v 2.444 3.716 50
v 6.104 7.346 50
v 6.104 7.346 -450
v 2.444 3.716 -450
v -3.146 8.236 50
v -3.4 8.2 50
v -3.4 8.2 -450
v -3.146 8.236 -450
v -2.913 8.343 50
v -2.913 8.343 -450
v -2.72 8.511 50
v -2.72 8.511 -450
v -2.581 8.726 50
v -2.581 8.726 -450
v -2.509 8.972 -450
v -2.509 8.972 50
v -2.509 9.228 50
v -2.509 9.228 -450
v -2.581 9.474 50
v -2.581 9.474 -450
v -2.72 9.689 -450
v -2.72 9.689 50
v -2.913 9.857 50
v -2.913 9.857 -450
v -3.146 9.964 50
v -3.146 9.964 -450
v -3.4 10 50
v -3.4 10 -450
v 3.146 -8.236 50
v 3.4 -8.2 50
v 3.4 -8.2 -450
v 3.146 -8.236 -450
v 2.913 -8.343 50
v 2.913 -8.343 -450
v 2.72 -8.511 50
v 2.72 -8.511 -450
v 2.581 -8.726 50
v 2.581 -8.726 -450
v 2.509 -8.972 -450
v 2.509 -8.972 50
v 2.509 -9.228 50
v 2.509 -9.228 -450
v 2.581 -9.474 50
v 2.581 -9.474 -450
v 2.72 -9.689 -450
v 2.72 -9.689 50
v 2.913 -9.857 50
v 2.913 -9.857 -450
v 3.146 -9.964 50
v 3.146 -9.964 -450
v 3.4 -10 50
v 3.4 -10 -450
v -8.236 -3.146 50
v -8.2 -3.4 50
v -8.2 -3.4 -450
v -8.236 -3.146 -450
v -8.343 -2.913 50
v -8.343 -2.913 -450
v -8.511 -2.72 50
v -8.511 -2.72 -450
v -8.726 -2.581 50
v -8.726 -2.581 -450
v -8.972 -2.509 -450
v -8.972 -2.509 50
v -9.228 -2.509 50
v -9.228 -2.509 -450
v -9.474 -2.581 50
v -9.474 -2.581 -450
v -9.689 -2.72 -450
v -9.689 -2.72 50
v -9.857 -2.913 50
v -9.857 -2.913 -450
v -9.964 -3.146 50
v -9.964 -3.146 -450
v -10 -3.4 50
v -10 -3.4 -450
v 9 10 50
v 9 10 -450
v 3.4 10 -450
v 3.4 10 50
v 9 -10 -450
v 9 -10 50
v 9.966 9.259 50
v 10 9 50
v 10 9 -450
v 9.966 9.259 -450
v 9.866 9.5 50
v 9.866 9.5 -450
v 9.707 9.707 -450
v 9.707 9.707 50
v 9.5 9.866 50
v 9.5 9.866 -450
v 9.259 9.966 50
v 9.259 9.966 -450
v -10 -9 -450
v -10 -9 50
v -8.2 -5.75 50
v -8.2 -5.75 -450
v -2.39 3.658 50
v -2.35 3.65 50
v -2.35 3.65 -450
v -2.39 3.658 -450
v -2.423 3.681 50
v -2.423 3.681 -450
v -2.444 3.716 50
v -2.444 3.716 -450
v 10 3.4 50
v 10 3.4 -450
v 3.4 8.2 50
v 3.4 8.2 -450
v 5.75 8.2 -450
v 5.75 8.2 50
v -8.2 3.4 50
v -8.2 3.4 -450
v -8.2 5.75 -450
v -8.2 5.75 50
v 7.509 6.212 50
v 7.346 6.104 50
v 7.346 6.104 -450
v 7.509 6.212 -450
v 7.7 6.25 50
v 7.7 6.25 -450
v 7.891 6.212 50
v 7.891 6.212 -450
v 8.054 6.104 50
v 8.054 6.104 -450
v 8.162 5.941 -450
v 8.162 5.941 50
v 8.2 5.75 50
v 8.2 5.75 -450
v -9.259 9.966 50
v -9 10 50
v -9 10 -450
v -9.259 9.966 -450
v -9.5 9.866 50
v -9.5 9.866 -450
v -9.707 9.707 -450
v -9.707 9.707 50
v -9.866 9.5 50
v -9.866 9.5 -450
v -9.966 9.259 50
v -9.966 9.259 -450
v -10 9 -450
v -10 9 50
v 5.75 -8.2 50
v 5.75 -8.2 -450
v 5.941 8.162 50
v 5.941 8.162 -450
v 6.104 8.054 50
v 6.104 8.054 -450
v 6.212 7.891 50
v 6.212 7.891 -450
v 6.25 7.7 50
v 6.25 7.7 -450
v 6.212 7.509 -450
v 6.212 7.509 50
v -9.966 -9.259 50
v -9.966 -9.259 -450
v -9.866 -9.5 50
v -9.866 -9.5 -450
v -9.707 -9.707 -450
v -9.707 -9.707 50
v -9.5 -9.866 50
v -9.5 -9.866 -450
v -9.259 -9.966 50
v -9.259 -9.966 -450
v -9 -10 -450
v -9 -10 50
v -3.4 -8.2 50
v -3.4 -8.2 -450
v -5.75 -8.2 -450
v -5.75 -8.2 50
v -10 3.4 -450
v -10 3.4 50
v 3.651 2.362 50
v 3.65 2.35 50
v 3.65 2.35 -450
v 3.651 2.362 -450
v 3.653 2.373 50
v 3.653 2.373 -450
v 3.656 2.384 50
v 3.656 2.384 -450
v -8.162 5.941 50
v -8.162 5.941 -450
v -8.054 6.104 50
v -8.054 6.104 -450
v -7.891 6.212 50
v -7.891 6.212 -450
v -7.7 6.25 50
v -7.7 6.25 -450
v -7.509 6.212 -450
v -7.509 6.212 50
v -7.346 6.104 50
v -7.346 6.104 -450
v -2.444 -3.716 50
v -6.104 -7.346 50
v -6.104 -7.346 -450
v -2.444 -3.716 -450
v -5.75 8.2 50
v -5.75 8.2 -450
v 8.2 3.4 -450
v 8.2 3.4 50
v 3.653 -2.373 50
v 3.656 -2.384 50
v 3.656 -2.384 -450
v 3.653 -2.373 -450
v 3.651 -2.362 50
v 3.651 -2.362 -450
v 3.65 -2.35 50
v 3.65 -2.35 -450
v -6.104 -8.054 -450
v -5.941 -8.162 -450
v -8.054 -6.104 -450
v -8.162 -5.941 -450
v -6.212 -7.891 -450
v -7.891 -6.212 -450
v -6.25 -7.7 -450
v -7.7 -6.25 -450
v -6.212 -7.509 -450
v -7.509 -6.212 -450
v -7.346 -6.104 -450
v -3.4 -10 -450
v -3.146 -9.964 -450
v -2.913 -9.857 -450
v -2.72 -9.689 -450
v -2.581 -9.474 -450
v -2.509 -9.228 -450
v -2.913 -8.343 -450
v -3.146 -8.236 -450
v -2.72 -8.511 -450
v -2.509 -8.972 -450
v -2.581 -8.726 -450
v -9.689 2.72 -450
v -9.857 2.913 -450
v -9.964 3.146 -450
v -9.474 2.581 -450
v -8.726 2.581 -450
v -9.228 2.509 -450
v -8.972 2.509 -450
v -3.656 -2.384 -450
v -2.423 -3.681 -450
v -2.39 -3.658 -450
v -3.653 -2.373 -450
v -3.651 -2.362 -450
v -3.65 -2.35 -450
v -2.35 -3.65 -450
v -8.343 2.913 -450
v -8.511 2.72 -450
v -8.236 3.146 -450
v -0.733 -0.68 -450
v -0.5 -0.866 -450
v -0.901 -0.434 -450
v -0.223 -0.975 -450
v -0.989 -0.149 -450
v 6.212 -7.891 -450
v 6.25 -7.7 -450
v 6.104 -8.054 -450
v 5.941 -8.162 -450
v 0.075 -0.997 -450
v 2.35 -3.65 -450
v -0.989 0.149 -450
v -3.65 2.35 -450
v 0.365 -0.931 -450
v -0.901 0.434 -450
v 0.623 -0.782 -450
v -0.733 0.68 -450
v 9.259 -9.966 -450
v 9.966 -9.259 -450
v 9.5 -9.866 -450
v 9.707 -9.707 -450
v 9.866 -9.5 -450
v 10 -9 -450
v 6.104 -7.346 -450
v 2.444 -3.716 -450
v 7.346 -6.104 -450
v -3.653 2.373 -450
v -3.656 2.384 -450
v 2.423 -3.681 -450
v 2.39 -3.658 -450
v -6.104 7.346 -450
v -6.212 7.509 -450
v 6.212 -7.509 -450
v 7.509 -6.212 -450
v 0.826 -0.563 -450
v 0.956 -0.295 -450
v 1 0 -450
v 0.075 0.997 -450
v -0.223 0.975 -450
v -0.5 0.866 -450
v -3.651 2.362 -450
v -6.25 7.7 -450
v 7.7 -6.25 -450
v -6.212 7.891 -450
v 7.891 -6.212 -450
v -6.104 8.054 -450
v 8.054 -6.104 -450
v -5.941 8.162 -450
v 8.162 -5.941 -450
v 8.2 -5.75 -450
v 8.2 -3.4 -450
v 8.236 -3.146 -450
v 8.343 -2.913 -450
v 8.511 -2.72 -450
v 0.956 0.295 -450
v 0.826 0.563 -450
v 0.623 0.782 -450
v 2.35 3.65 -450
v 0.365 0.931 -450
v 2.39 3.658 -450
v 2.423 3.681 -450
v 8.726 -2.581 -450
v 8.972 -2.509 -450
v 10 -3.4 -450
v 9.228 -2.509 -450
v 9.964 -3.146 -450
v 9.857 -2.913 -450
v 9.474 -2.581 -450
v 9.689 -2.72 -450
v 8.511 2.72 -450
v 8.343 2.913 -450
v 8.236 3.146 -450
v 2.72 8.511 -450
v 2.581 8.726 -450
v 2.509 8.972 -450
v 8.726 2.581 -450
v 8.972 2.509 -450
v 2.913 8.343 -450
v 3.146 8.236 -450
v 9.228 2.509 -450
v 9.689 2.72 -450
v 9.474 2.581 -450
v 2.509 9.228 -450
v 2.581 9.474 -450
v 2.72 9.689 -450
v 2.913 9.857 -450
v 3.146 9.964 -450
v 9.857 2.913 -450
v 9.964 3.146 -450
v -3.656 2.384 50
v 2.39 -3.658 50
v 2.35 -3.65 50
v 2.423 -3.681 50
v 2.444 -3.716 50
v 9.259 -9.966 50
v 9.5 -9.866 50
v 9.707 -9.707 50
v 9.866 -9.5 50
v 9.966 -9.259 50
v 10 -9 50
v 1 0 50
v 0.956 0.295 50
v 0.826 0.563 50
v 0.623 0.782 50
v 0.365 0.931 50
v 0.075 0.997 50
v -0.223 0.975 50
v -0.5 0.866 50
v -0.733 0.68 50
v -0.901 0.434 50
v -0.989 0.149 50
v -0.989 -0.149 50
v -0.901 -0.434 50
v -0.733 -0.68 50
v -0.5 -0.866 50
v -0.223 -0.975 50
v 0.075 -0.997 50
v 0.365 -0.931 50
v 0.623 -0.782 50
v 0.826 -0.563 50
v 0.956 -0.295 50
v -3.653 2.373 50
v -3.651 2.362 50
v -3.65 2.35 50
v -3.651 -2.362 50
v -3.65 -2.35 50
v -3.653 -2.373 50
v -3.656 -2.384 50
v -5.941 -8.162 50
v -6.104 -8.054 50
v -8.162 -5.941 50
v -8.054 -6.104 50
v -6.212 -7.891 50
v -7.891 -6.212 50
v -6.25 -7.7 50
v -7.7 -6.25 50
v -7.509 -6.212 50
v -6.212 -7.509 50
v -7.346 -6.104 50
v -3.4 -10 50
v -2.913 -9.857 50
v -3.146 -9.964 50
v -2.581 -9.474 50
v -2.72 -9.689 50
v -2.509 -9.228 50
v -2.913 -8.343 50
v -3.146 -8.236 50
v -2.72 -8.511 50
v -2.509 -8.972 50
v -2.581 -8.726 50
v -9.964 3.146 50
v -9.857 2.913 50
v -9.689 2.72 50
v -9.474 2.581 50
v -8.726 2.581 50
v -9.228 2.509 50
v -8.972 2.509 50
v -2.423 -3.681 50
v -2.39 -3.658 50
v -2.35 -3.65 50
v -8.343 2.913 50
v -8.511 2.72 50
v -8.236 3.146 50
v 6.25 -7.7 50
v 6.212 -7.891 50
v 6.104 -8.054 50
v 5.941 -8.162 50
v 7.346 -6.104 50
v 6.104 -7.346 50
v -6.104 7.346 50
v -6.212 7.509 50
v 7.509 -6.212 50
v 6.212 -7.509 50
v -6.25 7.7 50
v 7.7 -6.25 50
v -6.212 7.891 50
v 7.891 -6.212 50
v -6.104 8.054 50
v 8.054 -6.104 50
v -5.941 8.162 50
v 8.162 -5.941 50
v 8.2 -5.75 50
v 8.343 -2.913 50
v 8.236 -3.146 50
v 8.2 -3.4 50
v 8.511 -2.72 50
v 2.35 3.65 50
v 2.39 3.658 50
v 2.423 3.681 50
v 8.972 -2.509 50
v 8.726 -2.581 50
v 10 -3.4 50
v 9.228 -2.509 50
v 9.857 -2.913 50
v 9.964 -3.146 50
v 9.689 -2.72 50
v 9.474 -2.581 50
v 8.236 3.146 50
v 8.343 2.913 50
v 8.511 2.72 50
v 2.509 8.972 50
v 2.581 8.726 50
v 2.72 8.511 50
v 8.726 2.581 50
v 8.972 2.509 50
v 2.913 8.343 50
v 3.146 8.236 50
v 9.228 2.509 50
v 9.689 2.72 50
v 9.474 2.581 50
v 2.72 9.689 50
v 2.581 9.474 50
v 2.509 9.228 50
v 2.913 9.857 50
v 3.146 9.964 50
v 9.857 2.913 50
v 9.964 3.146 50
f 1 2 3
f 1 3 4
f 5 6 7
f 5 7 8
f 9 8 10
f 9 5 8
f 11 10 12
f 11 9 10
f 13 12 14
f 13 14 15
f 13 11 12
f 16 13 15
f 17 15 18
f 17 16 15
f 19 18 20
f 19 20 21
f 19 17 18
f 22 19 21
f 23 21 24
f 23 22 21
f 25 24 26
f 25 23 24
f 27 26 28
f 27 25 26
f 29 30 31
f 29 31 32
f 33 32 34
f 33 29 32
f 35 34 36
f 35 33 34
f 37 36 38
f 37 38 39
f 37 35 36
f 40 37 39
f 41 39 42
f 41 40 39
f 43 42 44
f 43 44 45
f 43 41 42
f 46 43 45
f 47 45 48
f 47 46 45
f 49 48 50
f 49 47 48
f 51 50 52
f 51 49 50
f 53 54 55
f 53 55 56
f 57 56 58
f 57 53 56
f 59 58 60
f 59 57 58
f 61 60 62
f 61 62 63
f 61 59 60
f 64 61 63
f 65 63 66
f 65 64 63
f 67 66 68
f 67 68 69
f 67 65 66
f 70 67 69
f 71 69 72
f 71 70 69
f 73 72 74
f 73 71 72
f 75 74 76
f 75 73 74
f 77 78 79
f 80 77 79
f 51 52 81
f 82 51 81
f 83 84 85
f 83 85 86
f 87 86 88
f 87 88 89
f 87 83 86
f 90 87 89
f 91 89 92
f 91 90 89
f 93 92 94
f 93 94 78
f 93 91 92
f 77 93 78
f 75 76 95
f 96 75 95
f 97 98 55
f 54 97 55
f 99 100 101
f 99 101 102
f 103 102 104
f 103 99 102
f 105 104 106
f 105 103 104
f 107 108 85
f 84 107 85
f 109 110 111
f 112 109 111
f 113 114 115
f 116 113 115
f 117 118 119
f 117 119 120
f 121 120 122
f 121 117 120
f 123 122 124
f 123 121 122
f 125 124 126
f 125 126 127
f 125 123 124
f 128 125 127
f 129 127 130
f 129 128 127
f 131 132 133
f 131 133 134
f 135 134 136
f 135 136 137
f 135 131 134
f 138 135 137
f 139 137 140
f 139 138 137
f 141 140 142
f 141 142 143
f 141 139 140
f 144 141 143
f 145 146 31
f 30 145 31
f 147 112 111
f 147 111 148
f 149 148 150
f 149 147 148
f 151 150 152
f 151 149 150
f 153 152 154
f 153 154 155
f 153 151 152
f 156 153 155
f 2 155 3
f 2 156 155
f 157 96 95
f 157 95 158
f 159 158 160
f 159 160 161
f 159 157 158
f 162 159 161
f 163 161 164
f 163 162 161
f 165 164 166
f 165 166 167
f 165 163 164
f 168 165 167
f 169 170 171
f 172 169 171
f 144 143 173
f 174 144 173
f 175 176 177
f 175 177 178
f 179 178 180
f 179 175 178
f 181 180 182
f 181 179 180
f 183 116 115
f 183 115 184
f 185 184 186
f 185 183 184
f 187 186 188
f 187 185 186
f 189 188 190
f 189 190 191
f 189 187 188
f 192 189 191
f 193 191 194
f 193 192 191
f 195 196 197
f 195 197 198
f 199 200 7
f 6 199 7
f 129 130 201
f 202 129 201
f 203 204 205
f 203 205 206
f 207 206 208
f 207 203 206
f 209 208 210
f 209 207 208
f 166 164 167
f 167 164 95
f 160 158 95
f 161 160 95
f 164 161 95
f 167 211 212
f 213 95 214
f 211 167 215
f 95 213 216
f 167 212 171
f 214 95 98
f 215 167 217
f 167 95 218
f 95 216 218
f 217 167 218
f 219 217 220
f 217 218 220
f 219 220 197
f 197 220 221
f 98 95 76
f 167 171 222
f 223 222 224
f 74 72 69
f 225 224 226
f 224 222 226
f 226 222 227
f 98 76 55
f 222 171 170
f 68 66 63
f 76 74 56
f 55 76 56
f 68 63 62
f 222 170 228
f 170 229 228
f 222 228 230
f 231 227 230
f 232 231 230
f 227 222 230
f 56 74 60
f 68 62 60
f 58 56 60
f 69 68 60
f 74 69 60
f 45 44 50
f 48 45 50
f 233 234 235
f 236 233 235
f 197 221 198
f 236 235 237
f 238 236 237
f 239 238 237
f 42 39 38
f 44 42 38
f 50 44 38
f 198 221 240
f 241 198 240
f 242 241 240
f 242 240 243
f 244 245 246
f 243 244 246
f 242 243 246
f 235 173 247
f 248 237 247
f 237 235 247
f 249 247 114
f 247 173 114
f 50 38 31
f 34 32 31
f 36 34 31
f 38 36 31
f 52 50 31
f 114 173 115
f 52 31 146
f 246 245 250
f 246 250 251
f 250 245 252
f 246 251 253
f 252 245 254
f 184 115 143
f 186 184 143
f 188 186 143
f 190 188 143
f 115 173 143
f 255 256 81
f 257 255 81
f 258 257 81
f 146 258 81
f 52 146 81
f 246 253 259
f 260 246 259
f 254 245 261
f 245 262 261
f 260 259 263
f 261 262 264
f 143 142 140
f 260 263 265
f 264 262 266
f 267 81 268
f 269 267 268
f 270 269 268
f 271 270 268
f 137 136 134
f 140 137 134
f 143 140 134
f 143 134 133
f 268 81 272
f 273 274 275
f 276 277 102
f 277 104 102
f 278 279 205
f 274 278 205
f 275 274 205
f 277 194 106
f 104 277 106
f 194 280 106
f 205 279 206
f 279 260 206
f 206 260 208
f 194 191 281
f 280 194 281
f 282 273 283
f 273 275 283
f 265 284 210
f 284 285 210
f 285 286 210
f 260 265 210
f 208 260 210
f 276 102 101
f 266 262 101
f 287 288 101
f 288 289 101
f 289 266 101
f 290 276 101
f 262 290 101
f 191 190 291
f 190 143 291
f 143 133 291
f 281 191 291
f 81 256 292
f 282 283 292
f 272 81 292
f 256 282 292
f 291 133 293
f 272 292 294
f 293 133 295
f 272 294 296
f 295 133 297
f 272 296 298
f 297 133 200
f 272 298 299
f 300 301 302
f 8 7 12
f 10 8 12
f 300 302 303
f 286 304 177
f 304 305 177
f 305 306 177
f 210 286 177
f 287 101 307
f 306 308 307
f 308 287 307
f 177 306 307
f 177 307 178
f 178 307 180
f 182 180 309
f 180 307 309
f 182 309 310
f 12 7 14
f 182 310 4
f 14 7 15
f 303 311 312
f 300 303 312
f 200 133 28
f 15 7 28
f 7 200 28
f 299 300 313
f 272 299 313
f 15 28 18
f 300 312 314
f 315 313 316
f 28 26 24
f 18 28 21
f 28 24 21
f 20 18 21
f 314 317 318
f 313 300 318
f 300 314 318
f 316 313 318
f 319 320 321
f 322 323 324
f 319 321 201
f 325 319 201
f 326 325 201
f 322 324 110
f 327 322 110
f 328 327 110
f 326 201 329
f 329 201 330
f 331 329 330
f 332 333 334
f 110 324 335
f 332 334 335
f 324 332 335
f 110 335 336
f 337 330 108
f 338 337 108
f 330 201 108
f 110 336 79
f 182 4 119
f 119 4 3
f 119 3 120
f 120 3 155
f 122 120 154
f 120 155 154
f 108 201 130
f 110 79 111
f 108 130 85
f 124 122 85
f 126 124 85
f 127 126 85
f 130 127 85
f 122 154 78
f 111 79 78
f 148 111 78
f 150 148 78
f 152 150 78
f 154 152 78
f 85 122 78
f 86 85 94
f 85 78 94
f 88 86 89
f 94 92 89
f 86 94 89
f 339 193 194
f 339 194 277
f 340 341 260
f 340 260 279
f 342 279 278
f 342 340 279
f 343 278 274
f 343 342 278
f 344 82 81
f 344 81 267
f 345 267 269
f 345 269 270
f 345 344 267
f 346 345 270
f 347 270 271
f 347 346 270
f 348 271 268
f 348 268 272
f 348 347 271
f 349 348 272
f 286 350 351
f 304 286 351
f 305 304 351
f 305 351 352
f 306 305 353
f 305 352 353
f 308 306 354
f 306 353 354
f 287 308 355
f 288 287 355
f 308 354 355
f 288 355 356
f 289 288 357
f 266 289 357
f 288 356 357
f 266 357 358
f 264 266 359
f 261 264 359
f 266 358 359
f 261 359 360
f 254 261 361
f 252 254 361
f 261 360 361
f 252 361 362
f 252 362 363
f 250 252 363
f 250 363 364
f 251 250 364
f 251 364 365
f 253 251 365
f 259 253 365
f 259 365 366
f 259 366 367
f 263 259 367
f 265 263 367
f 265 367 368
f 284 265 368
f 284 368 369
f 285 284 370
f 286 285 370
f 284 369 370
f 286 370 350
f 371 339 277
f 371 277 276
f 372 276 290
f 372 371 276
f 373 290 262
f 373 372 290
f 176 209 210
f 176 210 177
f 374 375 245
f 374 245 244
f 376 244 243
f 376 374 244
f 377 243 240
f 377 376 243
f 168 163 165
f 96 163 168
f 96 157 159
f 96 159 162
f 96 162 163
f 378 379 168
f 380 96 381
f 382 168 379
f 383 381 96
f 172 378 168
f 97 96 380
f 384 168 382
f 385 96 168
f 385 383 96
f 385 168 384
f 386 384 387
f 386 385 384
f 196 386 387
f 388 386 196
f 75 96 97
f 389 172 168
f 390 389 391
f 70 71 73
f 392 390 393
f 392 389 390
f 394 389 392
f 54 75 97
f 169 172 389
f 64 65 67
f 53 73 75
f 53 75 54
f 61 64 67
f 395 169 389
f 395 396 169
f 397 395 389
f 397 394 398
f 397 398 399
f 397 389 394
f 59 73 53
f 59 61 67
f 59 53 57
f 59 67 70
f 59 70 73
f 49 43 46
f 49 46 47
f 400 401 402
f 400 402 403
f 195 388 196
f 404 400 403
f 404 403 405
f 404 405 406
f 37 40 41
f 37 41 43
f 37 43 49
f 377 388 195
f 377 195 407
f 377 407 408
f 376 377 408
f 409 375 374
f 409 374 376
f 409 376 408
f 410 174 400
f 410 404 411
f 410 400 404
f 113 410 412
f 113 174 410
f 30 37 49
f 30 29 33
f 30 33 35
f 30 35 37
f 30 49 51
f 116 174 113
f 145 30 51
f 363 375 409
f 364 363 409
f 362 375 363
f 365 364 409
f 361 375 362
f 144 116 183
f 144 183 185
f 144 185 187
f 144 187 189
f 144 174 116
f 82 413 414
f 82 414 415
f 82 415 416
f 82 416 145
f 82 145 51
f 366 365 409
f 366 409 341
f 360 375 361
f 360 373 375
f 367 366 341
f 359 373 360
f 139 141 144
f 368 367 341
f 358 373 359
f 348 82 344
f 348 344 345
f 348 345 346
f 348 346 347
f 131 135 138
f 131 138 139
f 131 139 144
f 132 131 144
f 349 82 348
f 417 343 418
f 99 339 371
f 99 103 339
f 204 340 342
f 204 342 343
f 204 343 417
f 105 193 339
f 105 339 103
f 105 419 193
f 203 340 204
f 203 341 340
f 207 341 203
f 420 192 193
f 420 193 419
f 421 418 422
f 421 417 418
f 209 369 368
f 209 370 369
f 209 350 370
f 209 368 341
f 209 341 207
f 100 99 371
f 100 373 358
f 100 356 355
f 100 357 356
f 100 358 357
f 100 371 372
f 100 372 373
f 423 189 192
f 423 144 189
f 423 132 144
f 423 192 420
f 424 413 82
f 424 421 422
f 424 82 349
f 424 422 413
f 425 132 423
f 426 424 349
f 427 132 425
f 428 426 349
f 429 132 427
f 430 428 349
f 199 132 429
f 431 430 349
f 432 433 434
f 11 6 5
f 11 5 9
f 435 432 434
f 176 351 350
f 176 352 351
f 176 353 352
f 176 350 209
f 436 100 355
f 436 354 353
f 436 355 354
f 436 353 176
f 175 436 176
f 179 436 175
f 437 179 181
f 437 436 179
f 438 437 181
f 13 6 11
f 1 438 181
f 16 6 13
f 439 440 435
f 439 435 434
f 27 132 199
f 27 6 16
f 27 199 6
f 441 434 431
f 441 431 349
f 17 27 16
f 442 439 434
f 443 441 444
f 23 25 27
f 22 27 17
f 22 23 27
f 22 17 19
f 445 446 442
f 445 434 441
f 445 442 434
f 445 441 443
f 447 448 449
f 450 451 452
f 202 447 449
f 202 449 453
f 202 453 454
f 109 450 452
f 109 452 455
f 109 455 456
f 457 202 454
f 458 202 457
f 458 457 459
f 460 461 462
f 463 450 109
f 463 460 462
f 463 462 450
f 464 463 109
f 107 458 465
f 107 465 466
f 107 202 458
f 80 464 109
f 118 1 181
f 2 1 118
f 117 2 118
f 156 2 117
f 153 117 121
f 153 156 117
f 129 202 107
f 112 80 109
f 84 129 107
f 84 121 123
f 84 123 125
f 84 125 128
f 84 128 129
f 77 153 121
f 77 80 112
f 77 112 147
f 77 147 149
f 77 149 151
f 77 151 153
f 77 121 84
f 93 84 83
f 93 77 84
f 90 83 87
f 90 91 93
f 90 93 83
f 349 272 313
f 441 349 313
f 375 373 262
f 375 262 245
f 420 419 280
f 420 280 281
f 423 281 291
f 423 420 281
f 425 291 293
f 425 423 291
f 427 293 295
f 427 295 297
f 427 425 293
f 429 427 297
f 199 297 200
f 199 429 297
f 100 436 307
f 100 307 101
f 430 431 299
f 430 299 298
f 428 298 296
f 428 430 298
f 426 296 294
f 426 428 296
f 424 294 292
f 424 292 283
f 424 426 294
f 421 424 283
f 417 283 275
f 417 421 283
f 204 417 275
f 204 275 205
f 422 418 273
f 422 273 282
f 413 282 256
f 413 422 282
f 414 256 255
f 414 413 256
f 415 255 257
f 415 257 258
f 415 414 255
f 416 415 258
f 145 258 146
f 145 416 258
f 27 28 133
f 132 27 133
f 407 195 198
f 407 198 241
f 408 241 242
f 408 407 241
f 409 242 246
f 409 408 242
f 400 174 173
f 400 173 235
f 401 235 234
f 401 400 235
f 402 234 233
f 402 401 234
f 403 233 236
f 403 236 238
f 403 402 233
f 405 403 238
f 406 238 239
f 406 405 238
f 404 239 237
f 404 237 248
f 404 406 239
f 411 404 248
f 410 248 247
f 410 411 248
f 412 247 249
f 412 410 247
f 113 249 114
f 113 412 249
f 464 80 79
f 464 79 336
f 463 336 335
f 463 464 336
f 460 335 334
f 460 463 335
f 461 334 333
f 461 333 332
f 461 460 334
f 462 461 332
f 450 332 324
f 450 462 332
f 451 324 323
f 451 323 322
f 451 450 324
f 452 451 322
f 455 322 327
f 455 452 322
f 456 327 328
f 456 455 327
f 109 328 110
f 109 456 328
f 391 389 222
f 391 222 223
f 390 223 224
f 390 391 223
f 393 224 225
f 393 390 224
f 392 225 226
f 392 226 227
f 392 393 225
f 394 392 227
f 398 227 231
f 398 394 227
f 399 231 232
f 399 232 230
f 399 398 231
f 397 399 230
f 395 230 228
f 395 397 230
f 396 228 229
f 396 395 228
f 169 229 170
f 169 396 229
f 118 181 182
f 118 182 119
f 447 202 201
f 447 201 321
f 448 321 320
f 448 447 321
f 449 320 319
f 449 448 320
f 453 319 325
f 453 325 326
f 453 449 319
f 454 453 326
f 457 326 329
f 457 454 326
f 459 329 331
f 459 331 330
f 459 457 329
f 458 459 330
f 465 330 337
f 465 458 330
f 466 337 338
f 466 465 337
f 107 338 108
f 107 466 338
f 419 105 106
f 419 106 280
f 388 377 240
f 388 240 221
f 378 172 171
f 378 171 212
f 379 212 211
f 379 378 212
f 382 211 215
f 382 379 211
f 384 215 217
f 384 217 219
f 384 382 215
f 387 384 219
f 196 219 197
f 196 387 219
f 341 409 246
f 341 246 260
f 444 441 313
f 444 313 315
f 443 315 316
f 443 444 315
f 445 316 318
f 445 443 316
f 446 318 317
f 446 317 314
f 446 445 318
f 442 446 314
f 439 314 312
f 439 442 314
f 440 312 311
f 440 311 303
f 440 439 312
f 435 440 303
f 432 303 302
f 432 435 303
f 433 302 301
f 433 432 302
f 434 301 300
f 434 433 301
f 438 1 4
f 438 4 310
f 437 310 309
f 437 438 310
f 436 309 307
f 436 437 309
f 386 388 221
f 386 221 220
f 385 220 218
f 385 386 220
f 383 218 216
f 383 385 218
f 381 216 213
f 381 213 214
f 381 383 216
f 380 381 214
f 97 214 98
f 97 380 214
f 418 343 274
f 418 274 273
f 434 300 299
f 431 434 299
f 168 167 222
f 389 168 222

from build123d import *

# Parameters (mm, degrees)
SKETCH1_R           = 1
BOSS_EXTRUDE1_DEPTH = 500


with BuildPart() as part:
    # Sketch1 → Boss-Extrude1 (new body)
    with BuildSketch(Plane.XY.offset(50)):
        with BuildLine():
            Line((-10, 9), (-10, 3.4))
            ThreePointArc((-10, 3.4), (-9.1, 2.5), (-8.2, 3.4))
            Line((-8.2, 3.4), (-8.2, 5.75))
            ThreePointArc((-8.2, 5.75), (-7.891341716, 6.211939766), (-7.346446609, 6.103553391))
            Line((-7.346446609, 6.103553391), (-3.656030738, 2.384202014))
            ThreePointArc((-3.656030738, 2.384202014), (-3.651519225, 2.367364818), (-3.65, 2.35))
            Line((-3.65, 2.35), (-3.65, -2.35))
            ThreePointArc((-3.65, -2.35), (-3.651519225, -2.367364818), (-3.656030738, -2.384202014))
            Line((-3.656030738, -2.384202014), (-7.346446609, -6.103553391))
            ThreePointArc((-7.346446609, -6.103553391), (-7.891341716, -6.211939766), (-8.2, -5.75))
            Line((-8.2, -5.75), (-8.2, -3.4))
            ThreePointArc((-8.2, -3.4), (-9.1, -2.5), (-10, -3.4))
            Line((-10, -3.4), (-10, -9))
            ThreePointArc((-10, -9), (-9.707106781, -9.707106781), (-9, -10))
            Line((-9, -10), (-3.4, -10))
            ThreePointArc((-3.4, -10), (-2.5, -9.1), (-3.4, -8.2))
            Line((-3.4, -8.2), (-5.75, -8.2))
            ThreePointArc((-5.75, -8.2), (-6.211939766, -7.891341716), (-6.103553391, -7.346446609))
            Line((-6.103553391, -7.346446609), (-2.443969262, -3.715797986))
            ThreePointArc((-2.443969262, -3.715797986), (-2.407357644, -3.668084796), (-2.35, -3.65))
            Line((-2.35, -3.65), (2.35, -3.65))
            ThreePointArc((2.35, -3.65), (2.407357644, -3.668084796), (2.443969262, -3.715797986))
            Line((2.443969262, -3.715797986), (6.103553391, -7.346446609))
            ThreePointArc((6.103553391, -7.346446609), (6.211939766, -7.891341716), (5.75, -8.2))
            Line((5.75, -8.2), (3.4, -8.2))
            ThreePointArc((3.4, -8.2), (2.5, -9.1), (3.4, -10))
            Line((3.4, -10), (9, -10))
            ThreePointArc((9, -10), (9.707106781, -9.707106781), (10, -9))
            Line((10, -9), (10, -3.4))
            ThreePointArc((10, -3.4), (9.1, -2.5), (8.2, -3.4))
            Line((8.2, -3.4), (8.2, -5.75))
            ThreePointArc((8.2, -5.75), (7.891341716, -6.211939766), (7.346446609, -6.103553391))
            Line((7.346446609, -6.103553391), (3.656030738, -2.384202014))
            ThreePointArc((3.656030738, -2.384202014), (3.651519225, -2.367364818), (3.65, -2.35))
            Line((3.65, -2.35), (3.65, 2.35))
            ThreePointArc((3.65, 2.35), (3.651519225, 2.367364818), (3.656030738, 2.384202014))
            Line((3.656030738, 2.384202014), (7.346446609, 6.103553391))
            ThreePointArc((7.346446609, 6.103553391), (7.891341716, 6.211939766), (8.2, 5.75))
            Line((8.2, 5.75), (8.2, 3.4))
            ThreePointArc((8.2, 3.4), (9.1, 2.5), (10, 3.4))
            Line((10, 3.4), (10, 9))
            ThreePointArc((10, 9), (9.707106781, 9.707106781), (9, 10))
            Line((9, 10), (3.4, 10))
            ThreePointArc((3.4, 10), (2.5, 9.1), (3.4, 8.2))
            Line((3.4, 8.2), (5.75, 8.2))
            ThreePointArc((5.75, 8.2), (6.211939766, 7.891341716), (6.103553391, 7.346446609))
            Line((6.103553391, 7.346446609), (2.443969262, 3.715797986))
            ThreePointArc((2.443969262, 3.715797986), (2.407357644, 3.668084796), (2.35, 3.65))
            Line((2.35, 3.65), (-2.35, 3.65))
            ThreePointArc((-2.35, 3.65), (-2.407357644, 3.668084796), (-2.443969262, 3.715797986))
            Line((-2.443969262, 3.715797986), (-6.103553391, 7.346446609))
            ThreePointArc((-6.103553391, 7.346446609), (-6.211939766, 7.891341716), (-5.75, 8.2))
            Line((-5.75, 8.2), (-3.4, 8.2))
            ThreePointArc((-3.4, 8.2), (-2.5, 9.1), (-3.4, 10))
            Line((-3.4, 10), (-9, 10))
            ThreePointArc((-9, 10), (-9.707106781, 9.707106781), (-10, 9))
        make_face()
        Circle(SKETCH1_R, mode=Mode.SUBTRACT)
    extrude(amount=-BOSS_EXTRUDE1_DEPTH)


solid = part.part
